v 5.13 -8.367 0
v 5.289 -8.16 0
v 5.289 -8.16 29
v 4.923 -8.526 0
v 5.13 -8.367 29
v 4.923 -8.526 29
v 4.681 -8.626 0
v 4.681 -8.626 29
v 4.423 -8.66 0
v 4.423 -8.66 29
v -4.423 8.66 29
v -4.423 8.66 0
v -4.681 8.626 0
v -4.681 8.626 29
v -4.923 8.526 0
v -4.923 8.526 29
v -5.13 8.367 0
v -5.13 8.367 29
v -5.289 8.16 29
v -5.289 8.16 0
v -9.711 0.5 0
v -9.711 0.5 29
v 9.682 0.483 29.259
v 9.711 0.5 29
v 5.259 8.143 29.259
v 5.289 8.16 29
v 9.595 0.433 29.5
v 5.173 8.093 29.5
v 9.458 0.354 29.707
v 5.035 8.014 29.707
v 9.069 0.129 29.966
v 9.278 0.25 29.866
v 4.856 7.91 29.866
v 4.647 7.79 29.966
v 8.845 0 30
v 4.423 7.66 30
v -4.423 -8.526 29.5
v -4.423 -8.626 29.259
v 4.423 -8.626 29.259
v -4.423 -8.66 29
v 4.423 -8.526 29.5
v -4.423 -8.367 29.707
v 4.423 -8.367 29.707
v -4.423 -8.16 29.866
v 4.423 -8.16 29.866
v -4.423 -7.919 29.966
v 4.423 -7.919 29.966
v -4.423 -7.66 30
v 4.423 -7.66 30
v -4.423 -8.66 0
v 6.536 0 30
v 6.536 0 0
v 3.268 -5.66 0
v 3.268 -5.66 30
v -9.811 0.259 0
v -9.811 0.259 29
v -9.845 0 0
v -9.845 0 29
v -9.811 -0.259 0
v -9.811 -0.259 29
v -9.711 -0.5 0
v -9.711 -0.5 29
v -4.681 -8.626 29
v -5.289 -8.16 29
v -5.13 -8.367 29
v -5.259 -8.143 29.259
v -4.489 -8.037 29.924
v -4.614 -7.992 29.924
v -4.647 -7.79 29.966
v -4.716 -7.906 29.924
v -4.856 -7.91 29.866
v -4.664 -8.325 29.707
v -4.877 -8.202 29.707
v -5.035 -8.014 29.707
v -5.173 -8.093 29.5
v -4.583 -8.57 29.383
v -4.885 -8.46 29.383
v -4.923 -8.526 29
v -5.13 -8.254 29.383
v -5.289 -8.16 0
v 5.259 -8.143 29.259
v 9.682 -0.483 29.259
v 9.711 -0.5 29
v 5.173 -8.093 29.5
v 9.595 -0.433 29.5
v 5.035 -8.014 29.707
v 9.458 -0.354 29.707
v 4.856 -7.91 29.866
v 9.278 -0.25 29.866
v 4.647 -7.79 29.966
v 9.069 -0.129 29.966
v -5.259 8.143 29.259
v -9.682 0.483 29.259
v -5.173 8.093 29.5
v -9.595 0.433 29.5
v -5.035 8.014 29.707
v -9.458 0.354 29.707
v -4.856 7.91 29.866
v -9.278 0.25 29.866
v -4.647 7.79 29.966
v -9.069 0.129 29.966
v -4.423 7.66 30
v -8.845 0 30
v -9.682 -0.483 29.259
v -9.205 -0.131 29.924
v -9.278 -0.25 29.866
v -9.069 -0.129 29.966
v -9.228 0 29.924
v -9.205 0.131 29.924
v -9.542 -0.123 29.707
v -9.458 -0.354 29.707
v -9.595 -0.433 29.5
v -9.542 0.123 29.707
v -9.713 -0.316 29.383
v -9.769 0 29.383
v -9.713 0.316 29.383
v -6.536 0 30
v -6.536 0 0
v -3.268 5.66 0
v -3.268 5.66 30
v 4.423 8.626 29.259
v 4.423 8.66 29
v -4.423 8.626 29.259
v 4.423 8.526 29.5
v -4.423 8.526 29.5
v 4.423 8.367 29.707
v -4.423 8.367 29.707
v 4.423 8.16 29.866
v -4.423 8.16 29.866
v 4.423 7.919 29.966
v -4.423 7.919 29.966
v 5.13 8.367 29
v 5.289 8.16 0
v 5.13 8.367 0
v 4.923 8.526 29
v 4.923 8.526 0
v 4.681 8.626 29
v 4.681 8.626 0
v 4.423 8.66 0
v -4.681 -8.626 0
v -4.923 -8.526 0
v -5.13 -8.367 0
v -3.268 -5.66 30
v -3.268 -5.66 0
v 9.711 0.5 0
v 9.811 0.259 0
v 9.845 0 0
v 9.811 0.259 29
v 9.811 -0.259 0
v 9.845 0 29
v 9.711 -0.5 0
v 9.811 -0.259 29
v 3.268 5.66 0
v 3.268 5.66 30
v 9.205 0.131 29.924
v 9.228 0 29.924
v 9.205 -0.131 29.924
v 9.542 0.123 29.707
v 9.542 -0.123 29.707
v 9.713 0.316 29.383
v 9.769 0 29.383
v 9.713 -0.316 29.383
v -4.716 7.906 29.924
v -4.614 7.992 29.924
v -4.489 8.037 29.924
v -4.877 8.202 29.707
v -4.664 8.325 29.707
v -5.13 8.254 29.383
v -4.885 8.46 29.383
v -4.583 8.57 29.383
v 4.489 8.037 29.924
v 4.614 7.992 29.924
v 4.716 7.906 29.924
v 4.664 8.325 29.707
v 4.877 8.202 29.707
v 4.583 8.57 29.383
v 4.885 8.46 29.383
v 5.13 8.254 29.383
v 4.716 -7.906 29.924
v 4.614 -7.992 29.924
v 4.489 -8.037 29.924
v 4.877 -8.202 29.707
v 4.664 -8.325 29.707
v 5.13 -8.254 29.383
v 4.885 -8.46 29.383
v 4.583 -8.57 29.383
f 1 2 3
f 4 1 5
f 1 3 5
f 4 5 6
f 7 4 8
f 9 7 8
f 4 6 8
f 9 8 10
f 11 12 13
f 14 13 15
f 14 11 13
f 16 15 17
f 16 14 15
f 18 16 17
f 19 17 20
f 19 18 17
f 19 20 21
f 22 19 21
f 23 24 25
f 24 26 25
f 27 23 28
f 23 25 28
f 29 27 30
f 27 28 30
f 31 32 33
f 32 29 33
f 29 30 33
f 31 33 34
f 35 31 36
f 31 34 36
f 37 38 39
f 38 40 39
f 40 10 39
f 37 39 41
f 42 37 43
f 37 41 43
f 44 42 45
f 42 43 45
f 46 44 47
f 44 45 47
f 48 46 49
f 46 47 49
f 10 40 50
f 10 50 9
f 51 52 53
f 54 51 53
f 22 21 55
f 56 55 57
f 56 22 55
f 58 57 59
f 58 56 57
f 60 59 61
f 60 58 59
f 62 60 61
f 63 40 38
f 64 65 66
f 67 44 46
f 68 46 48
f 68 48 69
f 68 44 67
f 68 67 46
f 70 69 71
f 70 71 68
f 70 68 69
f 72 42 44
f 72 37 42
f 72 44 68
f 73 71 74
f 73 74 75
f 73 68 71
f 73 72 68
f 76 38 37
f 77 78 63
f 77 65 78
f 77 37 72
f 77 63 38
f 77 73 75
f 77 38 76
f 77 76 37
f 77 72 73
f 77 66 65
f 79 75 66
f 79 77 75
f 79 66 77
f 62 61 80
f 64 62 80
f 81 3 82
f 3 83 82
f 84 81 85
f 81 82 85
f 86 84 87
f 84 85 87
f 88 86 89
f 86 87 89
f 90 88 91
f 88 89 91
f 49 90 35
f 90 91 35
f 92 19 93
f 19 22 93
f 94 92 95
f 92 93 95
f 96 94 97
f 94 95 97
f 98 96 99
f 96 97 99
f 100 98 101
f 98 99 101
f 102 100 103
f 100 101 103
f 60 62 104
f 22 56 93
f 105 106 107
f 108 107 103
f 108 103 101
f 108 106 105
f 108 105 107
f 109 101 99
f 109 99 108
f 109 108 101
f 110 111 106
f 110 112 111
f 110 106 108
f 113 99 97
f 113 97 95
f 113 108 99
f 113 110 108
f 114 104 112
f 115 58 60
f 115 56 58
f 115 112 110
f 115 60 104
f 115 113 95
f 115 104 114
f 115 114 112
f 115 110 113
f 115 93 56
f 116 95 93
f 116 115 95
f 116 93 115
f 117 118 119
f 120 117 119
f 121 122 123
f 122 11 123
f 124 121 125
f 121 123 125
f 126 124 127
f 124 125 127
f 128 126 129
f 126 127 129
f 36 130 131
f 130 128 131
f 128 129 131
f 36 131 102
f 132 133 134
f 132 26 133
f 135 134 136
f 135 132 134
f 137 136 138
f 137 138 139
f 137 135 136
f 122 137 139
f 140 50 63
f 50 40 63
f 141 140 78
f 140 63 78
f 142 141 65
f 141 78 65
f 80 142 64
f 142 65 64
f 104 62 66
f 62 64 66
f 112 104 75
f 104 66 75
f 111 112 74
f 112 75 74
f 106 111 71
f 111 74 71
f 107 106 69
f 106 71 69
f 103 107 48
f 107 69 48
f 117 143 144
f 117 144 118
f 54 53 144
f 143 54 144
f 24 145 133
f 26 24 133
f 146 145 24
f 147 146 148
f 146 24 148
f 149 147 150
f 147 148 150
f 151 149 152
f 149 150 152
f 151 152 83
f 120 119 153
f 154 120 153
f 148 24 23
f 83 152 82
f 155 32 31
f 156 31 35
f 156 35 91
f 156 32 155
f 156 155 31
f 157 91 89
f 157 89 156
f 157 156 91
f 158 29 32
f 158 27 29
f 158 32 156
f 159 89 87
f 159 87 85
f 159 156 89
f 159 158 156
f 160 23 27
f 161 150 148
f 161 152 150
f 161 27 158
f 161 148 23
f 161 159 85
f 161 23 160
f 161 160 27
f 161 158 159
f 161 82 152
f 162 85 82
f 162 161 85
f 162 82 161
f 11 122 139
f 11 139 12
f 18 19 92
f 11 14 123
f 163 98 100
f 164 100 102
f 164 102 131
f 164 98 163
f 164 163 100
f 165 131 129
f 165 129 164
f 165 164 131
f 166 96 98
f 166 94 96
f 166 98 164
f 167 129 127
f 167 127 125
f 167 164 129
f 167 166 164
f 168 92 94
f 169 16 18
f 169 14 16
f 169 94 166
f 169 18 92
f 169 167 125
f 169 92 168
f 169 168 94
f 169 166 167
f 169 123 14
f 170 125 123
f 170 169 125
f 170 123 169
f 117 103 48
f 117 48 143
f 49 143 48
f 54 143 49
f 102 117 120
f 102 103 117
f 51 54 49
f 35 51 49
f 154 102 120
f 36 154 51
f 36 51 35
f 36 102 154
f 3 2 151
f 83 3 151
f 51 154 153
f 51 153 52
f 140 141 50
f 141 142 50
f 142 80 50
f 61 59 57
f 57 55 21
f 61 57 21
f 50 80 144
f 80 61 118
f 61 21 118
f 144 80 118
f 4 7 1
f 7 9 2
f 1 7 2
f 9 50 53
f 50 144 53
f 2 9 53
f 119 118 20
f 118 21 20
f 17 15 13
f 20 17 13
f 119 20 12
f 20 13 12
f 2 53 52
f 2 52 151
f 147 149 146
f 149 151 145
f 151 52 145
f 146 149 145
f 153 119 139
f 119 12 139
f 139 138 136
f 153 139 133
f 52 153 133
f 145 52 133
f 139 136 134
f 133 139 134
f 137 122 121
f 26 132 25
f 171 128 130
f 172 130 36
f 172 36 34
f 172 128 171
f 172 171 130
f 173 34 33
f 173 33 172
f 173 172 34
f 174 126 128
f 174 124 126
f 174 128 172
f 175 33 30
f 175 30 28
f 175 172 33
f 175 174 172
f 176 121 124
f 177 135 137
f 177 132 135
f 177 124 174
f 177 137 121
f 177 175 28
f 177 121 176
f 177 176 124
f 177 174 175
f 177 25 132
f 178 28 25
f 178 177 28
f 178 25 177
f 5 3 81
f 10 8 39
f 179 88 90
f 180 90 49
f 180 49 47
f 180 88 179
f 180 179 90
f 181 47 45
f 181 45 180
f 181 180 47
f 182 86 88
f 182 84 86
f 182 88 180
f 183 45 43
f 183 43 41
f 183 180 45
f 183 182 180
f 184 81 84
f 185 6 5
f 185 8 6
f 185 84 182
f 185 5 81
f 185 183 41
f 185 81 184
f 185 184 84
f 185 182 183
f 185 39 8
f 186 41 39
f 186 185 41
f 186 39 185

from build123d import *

# Parameters (mm, degrees)
F1_DEPTH = 30
F2_R     = 1


with BuildPart() as f1:
    # F0 (on Top) → F1 (new body)
    with BuildSketch(Plane.XY):
        Polygon((10, 0), (5, 8.660254), (-5, 8.660254), (-10, 0), (-5, -8.660254), (5, -8.660254), align=None)
        Polygon((3.267949, -5.660254), (-3.267949, -5.660254), (-6.535898, 0), (-3.267949, 5.660254), (3.267949, 5.660254), (6.535898, 0), align=None, mode=Mode.SUBTRACT)
    extrude(amount=F1_DEPTH)

    # F2
    f2_edges = [f1.edges().sort_by_distance(p)[0] for p in [
        (-5, -8.660254, 15),
        (0, -8.660254, 30),
        (5, -8.660254, 15),
        (7.5, -4.330127, 30),
        (10, 0, 15),
        (7.5, 4.330127, 30),
        (5, 8.660254, 15),
        (0, 8.660254, 30),
        (-5, 8.660254, 15),
        (-7.5, 4.330127, 30),
        (-10, 0, 15),
        (-7.5, -4.330127, 30),
    ]]
    fillet(f2_edges, radius=F2_R)


solid = f1.part
